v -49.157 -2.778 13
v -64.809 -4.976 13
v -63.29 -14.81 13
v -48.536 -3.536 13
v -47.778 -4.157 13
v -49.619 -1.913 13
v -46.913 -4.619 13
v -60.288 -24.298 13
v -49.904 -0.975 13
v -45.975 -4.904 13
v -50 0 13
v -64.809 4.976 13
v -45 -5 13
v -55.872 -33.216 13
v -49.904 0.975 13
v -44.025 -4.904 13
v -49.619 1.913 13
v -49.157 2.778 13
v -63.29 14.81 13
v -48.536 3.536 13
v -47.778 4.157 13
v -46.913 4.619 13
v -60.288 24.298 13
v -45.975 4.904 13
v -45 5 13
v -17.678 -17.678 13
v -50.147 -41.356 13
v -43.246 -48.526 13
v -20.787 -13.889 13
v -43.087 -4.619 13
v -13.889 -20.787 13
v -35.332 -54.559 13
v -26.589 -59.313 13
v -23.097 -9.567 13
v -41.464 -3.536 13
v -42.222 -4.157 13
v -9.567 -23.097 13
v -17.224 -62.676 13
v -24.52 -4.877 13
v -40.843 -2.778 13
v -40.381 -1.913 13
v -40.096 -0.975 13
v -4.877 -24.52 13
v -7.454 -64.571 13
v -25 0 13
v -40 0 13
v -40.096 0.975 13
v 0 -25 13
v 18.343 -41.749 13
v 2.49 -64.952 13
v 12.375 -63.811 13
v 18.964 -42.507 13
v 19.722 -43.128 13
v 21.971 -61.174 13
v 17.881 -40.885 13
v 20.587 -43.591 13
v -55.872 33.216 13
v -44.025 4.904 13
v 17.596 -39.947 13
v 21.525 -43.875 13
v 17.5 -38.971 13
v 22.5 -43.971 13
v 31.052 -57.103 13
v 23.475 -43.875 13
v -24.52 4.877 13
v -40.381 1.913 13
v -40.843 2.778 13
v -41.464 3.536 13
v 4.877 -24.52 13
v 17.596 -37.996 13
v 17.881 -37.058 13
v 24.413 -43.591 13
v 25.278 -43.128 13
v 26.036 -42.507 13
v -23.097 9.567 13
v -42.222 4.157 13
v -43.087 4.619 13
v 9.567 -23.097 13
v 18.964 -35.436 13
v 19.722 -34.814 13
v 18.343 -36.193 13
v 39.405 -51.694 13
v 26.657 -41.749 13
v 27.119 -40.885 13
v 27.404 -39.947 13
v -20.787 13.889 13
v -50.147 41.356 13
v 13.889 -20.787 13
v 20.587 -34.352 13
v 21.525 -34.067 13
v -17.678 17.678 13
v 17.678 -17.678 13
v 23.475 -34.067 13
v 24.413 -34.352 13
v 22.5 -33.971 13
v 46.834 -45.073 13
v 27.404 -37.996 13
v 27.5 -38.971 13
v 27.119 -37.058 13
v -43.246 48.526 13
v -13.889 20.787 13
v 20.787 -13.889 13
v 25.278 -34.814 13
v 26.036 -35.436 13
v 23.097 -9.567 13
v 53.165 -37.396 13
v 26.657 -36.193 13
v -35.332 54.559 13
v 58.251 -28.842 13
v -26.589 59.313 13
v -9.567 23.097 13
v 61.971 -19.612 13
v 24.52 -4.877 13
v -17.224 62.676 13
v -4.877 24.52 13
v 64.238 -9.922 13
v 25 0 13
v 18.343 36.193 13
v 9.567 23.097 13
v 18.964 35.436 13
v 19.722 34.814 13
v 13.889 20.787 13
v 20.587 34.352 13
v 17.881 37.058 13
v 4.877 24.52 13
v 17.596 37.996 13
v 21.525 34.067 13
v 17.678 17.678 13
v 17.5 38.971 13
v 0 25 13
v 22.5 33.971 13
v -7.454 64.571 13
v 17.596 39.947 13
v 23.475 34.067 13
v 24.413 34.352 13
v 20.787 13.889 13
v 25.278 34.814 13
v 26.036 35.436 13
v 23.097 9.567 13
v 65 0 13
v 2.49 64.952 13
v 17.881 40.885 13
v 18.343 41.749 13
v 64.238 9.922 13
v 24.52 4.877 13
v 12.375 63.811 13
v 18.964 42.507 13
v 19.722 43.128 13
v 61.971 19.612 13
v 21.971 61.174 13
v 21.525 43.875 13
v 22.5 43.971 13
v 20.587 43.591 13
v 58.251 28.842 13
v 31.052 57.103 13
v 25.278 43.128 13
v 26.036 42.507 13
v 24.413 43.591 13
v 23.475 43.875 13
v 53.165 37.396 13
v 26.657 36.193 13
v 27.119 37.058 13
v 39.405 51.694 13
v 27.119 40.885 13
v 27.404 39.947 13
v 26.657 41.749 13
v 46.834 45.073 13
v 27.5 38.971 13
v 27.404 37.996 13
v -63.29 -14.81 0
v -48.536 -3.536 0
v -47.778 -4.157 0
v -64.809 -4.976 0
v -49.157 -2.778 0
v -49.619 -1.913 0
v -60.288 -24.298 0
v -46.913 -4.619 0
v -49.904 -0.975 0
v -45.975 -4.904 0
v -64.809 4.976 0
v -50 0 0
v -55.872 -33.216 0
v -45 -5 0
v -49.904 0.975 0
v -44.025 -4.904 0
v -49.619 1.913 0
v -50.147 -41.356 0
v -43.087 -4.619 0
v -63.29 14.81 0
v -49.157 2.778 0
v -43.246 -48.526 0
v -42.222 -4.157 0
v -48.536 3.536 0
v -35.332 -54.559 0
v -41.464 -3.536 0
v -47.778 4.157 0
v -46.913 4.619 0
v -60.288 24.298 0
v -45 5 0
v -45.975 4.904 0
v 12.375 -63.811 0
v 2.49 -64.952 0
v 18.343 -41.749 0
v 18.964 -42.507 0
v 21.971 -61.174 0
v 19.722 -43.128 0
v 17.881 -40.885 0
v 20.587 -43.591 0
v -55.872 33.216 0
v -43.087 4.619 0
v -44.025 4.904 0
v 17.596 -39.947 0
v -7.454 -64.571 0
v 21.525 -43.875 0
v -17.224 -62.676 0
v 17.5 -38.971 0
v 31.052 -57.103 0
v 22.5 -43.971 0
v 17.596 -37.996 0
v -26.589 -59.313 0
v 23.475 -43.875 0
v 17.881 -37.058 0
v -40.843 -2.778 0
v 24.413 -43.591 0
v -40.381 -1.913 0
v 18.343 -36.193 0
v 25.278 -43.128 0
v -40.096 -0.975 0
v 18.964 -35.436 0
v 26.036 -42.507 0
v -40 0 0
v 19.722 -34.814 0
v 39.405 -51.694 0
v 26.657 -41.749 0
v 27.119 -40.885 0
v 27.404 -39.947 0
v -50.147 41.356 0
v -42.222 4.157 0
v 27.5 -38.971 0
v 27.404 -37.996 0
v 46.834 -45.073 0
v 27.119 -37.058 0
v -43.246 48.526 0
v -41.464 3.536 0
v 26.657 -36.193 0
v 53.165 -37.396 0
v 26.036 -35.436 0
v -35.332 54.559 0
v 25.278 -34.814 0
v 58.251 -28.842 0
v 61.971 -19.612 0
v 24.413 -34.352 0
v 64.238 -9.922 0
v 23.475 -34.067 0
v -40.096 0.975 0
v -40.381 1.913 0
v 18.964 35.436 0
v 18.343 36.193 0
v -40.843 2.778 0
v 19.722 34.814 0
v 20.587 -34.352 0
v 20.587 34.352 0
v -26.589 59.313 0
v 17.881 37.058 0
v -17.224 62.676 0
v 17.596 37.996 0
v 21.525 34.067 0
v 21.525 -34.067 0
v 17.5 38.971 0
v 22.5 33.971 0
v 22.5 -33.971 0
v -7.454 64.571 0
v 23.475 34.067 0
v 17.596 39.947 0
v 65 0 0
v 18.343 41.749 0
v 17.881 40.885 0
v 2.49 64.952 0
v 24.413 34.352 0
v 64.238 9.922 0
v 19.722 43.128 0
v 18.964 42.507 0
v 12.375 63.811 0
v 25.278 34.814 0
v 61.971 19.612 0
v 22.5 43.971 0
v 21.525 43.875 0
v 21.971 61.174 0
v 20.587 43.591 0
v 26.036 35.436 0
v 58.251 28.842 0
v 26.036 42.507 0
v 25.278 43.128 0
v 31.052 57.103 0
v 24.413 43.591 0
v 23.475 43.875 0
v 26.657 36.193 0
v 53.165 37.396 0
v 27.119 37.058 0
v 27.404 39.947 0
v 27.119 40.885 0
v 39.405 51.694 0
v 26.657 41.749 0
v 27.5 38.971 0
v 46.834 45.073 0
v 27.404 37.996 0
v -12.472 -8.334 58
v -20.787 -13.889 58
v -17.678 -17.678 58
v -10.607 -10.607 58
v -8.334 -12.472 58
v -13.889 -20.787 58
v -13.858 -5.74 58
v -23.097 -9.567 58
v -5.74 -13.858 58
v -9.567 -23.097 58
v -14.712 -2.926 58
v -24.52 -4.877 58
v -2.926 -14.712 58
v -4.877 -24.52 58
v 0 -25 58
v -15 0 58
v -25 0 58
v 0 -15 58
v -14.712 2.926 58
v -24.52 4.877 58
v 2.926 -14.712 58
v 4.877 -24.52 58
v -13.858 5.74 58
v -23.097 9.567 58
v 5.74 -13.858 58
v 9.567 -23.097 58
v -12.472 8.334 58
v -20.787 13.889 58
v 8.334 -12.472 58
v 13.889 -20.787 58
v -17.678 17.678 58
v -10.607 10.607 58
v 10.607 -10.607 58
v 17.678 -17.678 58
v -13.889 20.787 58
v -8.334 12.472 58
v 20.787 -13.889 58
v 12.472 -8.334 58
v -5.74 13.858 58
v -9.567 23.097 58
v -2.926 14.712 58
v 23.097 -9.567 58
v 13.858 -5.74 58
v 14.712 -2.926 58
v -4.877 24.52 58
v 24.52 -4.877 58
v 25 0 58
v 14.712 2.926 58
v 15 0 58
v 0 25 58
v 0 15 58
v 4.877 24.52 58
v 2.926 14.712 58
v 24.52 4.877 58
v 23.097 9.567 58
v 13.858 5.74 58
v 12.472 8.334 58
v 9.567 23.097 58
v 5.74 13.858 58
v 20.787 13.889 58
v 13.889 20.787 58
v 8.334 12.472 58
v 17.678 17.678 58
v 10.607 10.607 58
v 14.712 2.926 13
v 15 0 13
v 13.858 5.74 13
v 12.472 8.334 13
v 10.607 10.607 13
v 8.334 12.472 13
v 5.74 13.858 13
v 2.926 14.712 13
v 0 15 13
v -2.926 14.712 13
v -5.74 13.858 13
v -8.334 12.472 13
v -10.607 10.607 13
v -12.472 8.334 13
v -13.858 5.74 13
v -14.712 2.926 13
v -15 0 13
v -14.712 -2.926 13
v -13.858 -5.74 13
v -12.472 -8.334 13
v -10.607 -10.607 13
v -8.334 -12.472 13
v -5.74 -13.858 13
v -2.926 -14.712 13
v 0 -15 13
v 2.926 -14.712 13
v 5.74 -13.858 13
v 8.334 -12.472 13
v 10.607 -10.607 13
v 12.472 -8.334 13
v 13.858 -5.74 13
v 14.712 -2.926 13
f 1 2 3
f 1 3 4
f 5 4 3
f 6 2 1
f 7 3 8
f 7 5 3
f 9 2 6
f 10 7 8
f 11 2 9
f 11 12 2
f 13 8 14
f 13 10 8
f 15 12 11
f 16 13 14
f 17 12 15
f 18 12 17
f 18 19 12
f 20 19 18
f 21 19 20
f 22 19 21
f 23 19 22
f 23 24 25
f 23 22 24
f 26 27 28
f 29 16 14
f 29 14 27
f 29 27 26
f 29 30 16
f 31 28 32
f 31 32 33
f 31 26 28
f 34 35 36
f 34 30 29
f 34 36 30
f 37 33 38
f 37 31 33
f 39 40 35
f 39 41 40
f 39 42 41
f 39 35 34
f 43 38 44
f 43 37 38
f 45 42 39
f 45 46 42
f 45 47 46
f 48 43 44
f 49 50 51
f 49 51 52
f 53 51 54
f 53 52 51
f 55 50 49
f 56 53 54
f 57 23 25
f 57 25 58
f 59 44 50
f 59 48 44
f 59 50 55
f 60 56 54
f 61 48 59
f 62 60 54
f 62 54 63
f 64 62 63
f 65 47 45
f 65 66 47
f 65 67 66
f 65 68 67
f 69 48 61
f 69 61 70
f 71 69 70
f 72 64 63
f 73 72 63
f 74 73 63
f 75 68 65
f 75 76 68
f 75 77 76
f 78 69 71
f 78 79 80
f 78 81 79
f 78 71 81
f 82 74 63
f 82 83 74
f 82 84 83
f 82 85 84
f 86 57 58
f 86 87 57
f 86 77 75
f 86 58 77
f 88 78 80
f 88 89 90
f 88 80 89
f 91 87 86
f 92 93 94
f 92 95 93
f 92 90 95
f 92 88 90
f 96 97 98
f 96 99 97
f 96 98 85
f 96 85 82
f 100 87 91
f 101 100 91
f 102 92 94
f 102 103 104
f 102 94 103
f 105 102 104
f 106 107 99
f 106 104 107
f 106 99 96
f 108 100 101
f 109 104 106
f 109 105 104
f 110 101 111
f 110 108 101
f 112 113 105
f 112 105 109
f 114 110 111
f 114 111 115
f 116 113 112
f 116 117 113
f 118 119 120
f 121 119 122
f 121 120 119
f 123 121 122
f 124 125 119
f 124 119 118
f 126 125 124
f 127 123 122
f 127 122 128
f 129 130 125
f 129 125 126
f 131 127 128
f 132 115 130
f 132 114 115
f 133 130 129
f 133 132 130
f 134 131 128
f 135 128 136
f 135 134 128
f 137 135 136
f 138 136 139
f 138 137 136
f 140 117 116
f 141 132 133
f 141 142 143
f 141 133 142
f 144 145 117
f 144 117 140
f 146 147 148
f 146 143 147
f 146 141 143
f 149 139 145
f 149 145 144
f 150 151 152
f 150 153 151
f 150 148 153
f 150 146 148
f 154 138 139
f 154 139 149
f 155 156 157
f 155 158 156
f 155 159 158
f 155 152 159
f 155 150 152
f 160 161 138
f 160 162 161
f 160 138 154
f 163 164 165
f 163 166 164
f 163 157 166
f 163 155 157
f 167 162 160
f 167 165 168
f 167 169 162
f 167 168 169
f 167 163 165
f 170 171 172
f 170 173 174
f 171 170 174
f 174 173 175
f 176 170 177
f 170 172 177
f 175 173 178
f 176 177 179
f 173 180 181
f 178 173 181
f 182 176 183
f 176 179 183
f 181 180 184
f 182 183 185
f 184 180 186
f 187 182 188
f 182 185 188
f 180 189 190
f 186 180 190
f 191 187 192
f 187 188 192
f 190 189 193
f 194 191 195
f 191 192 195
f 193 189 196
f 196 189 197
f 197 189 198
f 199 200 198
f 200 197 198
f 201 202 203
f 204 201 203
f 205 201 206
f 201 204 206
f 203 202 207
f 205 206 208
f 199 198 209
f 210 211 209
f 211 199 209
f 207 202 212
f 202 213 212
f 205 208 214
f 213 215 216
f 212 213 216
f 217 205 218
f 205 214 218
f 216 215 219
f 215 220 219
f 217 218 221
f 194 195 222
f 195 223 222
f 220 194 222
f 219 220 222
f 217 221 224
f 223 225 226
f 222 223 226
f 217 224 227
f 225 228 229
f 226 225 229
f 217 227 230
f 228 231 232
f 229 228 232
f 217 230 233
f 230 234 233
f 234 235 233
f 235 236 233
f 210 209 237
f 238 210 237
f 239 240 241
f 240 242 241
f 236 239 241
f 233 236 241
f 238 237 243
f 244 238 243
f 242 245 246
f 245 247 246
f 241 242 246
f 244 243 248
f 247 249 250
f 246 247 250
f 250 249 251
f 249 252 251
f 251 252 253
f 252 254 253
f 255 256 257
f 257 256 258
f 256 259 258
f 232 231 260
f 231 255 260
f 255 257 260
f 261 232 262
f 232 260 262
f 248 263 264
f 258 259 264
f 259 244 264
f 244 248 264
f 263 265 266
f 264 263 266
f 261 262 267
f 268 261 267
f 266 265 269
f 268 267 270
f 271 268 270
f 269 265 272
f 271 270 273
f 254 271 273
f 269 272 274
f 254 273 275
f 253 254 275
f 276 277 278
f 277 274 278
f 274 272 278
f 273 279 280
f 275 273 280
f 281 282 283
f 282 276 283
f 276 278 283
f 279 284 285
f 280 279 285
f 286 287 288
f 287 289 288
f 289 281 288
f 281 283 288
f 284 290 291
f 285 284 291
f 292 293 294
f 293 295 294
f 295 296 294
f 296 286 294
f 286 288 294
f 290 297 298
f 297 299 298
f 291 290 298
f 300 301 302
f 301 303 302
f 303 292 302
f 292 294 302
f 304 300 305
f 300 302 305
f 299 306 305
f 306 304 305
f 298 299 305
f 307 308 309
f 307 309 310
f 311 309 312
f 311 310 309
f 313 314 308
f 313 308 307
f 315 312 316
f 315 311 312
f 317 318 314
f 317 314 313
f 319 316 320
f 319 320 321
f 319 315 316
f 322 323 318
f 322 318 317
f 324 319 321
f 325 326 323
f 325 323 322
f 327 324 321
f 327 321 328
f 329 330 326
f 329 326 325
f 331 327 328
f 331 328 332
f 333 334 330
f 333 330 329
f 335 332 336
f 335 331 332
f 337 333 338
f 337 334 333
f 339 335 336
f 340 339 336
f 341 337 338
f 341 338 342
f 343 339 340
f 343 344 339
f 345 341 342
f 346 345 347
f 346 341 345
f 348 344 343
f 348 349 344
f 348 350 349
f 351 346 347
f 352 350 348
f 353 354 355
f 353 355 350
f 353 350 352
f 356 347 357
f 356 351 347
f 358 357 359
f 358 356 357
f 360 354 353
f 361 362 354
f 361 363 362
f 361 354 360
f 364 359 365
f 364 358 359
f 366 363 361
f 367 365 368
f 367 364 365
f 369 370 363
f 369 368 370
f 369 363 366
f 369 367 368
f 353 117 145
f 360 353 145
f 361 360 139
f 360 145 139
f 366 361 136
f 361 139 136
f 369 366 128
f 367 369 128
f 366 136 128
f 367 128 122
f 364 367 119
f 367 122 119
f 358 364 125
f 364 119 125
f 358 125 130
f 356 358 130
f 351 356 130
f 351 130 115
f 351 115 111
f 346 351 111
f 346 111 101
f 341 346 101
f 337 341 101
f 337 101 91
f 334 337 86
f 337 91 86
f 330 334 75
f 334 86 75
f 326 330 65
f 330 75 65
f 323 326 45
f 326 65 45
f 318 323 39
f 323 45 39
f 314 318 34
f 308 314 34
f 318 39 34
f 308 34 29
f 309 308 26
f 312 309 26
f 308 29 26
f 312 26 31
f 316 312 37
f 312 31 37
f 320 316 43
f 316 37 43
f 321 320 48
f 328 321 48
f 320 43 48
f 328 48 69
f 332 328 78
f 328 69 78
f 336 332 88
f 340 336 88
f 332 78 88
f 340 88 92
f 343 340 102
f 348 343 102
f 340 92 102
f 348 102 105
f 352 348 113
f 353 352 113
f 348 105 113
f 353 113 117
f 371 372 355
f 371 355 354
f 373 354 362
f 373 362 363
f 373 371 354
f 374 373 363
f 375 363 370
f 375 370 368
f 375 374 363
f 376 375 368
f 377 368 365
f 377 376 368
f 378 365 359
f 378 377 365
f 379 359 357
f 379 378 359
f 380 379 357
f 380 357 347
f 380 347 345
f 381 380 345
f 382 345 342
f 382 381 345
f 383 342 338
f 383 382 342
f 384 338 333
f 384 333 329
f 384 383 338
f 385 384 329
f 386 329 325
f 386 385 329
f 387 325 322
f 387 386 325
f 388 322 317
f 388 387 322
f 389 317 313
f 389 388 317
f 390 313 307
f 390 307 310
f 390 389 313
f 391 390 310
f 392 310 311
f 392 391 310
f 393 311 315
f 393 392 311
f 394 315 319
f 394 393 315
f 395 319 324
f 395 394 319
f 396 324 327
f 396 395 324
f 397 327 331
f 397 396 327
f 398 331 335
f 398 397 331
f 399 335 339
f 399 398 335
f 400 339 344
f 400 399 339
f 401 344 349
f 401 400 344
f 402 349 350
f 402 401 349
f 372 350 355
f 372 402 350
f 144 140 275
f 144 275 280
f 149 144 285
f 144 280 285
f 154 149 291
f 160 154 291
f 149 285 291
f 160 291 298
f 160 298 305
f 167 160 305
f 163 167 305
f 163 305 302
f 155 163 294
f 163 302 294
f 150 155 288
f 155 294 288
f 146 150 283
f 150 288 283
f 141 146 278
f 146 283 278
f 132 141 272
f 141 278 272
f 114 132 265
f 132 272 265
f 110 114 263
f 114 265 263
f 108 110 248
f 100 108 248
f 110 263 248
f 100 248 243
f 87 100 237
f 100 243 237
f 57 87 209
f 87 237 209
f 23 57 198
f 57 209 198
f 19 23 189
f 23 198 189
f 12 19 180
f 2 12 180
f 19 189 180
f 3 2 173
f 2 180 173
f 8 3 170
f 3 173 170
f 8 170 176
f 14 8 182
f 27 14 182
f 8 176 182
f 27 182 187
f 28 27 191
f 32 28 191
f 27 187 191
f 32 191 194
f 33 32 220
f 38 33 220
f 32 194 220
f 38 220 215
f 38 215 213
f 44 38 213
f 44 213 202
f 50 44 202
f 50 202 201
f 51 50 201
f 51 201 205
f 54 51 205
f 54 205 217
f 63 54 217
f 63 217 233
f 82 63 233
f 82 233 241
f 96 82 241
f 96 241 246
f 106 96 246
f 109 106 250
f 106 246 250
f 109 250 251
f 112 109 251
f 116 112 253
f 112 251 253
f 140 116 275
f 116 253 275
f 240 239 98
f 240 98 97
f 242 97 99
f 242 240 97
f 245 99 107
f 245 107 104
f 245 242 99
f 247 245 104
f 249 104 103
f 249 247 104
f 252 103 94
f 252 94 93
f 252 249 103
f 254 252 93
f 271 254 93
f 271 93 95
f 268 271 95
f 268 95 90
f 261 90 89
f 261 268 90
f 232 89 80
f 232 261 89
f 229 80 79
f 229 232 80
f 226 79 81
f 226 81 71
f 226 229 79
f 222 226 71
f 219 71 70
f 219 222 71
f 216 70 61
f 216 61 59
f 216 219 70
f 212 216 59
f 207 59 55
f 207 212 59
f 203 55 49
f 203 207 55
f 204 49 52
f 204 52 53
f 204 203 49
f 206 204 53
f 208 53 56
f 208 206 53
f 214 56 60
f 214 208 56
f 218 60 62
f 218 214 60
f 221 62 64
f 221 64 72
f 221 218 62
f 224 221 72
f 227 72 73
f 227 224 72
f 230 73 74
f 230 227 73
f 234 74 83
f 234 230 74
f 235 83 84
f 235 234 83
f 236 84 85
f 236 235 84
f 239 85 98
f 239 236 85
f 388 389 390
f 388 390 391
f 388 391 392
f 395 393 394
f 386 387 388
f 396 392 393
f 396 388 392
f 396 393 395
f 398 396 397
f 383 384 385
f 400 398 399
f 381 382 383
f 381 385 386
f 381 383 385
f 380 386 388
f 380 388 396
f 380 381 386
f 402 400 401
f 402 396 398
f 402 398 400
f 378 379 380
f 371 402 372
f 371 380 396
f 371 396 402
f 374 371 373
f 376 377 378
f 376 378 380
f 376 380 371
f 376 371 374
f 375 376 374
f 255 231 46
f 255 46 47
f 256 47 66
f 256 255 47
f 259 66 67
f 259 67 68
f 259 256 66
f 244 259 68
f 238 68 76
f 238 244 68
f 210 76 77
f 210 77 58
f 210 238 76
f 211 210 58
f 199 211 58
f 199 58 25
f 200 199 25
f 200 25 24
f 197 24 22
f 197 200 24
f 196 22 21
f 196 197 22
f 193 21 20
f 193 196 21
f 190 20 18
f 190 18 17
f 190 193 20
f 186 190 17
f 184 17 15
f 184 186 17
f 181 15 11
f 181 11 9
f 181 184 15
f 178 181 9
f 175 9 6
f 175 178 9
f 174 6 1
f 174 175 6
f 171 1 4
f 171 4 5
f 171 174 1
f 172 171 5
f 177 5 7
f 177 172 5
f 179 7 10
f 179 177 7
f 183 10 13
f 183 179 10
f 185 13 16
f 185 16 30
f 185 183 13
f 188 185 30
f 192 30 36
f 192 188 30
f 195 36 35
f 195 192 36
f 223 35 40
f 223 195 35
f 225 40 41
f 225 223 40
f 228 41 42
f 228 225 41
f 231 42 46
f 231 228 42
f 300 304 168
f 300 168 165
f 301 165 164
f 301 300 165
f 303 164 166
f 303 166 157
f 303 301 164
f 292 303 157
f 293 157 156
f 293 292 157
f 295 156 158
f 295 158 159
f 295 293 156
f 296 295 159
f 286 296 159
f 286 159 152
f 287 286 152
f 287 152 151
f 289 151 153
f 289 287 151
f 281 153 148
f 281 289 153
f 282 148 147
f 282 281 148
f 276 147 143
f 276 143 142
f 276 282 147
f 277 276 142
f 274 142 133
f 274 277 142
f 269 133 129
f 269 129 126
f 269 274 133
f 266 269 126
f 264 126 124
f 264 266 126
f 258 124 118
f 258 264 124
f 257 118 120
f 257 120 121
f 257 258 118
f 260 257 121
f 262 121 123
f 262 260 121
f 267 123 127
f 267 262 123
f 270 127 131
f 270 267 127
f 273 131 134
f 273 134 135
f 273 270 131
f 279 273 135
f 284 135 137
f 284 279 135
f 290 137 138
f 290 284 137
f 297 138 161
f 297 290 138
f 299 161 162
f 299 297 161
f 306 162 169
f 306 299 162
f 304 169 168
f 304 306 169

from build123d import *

# Parameters (mm, degrees)
SKETCH_R      = 65
SKETCH_R_2    = 5
PAD_DEPTH     = 13
SKETCH001_R   = 25
SKETCH001_R_2 = 15
PAD001_DEPTH  = 45


with BuildPart() as part:
    # Sketch → Pad (new body)
    with BuildSketch(Plane.XY):
        Circle(SKETCH_R)
        with Locations((22.5, 38.971143)):
            Circle(SKETCH_R_2, mode=Mode.SUBTRACT)
        with Locations((-45, 0)):
            Circle(SKETCH_R_2, mode=Mode.SUBTRACT)
        with Locations((22.5, -38.971143)):
            Circle(SKETCH_R_2, mode=Mode.SUBTRACT)
    extrude(amount=PAD_DEPTH)

    # Sketch001 (on Face6 of Pad) → Pad001 (join)
    with BuildSketch(Plane.XY.offset(13)):
        Circle(SKETCH001_R)
        Circle(SKETCH001_R_2, mode=Mode.SUBTRACT)
    extrude(amount=PAD001_DEPTH)


solid = part.part
